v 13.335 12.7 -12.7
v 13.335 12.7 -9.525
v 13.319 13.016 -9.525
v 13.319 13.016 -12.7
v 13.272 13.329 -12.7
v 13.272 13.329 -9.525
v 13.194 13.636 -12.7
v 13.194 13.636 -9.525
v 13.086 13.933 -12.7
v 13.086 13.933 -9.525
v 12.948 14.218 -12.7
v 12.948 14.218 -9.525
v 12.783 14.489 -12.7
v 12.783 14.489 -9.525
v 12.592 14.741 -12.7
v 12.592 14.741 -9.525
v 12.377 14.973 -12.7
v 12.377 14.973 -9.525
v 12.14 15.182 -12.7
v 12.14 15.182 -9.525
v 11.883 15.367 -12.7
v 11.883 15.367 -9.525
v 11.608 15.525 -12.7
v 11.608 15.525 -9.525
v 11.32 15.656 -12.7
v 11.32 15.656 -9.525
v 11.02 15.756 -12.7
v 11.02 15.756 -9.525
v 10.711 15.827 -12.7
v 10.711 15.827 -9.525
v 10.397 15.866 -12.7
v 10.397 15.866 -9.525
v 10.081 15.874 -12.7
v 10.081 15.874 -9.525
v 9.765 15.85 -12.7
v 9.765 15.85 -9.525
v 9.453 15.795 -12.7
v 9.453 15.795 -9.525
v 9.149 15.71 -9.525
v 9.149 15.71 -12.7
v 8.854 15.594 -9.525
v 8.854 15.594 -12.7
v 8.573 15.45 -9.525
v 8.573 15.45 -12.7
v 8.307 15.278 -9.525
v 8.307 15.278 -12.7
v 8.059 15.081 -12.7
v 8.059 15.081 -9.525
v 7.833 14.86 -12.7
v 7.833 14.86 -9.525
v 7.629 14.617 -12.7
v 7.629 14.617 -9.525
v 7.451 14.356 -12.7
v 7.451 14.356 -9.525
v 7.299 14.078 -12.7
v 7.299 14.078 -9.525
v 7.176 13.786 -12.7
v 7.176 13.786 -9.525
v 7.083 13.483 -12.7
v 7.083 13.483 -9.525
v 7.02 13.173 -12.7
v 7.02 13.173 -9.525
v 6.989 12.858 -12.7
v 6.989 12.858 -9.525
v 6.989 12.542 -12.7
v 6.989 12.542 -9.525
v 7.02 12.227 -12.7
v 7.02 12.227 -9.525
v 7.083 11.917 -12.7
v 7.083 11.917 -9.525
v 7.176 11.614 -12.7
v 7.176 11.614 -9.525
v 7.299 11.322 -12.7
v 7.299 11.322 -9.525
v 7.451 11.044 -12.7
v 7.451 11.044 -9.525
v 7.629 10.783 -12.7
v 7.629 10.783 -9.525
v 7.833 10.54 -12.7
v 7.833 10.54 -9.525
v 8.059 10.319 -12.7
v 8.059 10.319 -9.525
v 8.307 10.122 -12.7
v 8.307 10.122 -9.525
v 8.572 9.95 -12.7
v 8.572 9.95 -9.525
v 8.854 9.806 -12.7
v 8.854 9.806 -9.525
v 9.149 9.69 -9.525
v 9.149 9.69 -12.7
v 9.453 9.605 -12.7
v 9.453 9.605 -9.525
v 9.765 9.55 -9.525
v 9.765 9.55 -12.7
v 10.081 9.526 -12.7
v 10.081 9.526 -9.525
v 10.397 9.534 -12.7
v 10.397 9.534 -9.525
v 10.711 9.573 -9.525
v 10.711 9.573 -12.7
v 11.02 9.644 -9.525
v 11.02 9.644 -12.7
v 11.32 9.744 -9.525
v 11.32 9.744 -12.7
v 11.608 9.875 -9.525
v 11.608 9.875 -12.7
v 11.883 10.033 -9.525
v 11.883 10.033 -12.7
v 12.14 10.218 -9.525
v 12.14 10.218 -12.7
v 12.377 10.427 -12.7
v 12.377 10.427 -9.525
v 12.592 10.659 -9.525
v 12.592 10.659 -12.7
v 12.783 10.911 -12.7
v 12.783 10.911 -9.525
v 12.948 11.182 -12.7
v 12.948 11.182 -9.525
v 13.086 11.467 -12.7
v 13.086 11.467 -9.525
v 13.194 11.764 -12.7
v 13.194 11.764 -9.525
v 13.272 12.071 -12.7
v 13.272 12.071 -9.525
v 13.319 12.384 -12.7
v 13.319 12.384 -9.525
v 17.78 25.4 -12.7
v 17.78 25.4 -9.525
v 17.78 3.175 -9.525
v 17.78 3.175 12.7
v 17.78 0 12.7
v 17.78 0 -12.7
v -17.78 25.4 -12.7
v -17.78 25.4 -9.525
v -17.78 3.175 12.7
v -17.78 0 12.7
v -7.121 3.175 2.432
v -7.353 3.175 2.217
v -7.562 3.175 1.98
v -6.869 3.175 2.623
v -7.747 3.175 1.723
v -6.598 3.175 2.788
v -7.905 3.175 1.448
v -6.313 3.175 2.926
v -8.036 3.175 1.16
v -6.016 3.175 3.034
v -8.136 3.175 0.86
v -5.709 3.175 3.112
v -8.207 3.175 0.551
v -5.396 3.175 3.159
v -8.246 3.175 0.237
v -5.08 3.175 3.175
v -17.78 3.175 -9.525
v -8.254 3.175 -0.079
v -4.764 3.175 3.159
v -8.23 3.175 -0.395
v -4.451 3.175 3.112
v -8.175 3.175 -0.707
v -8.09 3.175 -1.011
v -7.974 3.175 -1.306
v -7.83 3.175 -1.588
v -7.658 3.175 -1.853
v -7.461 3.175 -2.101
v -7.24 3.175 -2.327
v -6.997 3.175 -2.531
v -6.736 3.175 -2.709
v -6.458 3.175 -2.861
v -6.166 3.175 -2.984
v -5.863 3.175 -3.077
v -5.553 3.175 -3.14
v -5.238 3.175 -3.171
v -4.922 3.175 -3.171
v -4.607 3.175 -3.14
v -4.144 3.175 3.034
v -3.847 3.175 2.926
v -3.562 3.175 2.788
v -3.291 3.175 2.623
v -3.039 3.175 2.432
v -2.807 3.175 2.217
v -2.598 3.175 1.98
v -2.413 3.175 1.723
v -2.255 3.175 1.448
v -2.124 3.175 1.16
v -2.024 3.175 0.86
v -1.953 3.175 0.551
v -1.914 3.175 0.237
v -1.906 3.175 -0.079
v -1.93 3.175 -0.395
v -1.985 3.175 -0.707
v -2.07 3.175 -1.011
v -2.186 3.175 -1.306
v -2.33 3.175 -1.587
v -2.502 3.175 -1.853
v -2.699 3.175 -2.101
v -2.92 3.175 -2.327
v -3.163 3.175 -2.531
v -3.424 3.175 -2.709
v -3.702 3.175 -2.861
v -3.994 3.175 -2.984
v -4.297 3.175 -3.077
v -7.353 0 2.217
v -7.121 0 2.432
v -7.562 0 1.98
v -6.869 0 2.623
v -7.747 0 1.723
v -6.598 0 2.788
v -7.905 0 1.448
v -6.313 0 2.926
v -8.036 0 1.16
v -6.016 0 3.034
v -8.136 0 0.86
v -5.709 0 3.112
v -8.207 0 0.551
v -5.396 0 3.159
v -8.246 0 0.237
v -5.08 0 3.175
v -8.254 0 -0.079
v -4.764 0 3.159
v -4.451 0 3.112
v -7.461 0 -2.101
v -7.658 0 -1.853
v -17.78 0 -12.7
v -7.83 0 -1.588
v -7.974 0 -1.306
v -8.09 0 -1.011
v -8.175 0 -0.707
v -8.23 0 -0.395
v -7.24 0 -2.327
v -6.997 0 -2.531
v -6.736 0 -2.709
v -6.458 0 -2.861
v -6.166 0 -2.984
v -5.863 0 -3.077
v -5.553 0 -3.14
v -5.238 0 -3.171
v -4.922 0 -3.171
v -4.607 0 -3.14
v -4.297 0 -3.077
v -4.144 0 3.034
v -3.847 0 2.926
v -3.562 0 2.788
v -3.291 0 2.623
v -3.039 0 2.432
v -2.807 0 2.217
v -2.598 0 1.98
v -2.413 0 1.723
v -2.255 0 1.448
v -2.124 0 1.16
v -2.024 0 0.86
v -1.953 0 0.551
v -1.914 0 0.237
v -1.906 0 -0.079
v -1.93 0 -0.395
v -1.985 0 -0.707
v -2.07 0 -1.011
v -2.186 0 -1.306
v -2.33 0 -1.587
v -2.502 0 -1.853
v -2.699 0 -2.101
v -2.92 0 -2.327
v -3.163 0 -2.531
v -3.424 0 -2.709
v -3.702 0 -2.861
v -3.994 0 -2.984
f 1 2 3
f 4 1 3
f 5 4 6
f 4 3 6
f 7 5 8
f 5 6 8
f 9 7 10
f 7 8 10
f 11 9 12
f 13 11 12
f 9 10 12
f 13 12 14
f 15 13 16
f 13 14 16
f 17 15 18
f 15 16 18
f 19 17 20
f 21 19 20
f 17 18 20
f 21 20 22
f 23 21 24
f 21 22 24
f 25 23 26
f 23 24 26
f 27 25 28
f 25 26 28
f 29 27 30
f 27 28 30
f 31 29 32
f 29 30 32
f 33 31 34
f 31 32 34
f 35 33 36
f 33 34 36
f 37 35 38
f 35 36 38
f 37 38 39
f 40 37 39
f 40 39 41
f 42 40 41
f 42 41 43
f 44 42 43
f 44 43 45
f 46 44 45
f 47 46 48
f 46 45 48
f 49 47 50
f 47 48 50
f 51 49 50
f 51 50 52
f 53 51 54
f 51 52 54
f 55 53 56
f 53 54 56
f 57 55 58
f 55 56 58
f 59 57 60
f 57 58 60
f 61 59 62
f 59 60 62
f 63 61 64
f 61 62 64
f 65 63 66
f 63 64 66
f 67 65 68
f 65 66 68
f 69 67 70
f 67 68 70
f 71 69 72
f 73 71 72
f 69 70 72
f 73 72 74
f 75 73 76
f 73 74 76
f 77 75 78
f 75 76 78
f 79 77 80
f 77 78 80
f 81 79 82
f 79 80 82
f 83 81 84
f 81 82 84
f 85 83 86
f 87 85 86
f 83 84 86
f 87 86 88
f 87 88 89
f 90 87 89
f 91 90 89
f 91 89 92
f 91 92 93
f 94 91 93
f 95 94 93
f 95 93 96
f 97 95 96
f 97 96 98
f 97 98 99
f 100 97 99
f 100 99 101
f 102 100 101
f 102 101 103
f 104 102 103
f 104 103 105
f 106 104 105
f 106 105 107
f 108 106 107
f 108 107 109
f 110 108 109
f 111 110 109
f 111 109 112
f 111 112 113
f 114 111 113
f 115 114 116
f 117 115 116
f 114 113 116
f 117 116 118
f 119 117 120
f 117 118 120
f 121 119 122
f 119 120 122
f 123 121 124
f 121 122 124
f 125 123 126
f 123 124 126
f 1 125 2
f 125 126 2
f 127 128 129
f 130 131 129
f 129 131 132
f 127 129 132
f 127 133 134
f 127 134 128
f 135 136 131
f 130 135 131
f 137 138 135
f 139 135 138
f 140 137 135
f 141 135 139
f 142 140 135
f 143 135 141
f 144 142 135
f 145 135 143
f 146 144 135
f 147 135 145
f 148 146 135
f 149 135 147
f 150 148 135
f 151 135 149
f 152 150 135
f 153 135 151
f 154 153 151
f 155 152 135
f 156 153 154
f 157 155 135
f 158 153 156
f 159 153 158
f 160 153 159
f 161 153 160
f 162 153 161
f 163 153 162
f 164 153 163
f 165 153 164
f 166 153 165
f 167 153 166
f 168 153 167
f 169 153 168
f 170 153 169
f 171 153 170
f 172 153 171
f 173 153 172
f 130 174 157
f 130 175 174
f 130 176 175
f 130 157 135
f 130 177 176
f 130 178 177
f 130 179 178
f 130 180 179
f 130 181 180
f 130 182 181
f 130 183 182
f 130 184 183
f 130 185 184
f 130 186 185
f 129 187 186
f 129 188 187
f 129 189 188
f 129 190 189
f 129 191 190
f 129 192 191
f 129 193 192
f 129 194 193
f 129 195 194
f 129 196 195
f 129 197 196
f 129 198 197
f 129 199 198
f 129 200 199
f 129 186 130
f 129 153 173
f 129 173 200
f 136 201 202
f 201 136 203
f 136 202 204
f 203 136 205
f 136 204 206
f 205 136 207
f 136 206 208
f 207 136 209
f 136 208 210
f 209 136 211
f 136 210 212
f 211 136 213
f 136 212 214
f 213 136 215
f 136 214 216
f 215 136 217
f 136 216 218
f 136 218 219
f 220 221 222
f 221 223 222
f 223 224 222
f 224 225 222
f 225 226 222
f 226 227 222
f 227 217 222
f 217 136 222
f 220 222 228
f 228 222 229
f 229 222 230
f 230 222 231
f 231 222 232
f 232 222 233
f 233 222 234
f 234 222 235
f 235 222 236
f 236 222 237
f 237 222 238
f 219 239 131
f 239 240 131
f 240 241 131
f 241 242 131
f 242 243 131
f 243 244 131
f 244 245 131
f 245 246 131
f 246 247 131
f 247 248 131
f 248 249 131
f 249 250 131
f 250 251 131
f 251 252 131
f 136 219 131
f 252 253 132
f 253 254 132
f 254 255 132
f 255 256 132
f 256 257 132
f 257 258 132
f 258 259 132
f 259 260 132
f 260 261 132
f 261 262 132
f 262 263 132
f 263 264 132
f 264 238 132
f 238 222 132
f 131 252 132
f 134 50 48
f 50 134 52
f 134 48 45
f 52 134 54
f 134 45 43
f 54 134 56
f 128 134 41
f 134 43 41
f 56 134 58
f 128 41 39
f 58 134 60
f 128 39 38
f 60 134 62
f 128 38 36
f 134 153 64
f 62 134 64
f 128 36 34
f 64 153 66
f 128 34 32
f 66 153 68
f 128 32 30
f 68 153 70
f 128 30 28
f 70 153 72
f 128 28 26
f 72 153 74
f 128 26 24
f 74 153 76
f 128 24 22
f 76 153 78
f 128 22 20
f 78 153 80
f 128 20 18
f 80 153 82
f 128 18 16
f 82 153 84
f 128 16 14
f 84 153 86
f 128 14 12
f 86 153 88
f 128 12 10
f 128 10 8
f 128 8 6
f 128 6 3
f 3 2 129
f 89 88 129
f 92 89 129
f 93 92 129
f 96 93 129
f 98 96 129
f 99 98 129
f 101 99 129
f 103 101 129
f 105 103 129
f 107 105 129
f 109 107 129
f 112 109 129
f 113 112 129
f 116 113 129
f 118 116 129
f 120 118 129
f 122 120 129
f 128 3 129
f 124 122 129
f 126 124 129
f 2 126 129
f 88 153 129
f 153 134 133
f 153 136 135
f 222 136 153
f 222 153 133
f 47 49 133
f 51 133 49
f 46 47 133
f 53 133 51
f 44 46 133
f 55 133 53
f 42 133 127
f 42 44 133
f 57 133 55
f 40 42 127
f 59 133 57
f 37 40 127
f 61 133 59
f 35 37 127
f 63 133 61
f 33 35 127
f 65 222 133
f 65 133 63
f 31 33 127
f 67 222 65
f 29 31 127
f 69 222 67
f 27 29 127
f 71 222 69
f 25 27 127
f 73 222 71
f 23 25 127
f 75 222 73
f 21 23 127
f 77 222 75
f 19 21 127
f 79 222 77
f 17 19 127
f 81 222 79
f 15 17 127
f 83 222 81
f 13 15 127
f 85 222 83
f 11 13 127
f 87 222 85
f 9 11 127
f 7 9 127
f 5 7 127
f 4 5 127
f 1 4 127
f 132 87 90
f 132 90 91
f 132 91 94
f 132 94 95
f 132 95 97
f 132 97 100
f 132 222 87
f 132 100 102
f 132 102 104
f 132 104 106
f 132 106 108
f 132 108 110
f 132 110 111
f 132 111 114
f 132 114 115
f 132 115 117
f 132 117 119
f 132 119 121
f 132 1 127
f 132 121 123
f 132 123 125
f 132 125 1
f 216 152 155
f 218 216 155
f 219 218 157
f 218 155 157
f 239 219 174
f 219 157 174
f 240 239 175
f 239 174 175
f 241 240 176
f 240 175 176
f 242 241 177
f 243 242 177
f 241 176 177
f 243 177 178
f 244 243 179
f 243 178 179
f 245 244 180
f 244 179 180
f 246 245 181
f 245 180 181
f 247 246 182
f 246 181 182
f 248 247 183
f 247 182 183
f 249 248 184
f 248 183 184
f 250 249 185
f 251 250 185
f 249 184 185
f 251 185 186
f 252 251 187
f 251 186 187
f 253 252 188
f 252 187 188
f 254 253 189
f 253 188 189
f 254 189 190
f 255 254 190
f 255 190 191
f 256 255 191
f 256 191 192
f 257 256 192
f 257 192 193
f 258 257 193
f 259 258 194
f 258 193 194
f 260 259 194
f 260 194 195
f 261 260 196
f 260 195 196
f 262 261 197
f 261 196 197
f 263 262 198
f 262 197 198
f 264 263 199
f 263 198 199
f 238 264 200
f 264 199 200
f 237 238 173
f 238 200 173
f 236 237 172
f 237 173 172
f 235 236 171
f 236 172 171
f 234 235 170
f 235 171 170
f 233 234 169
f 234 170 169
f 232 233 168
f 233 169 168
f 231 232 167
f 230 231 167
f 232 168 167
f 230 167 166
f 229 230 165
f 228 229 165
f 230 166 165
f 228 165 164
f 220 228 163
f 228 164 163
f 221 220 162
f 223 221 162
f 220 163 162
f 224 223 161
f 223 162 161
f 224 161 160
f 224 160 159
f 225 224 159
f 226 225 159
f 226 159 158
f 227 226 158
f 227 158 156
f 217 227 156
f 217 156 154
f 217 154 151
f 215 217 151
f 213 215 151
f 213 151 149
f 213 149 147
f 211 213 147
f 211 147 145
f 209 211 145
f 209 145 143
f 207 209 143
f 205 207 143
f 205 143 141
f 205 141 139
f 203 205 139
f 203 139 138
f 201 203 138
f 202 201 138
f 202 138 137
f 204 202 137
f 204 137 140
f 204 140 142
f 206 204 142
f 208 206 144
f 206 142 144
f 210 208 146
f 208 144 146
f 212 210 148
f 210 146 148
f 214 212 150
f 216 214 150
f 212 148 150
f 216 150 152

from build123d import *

# Parameters (mm, degrees)
SKETCH1_W           = 35.56
SKETCH1_H           = 25.4
BOSS_EXTRUDE1_DEPTH = 3.175
SKETCH2_W           = 35.56
SKETCH2_H           = 3.175
BOSS_EXTRUDE2_DEPTH = 22.225
SKETCH3_R           = 3.175
CUT_EXTRUDE1_DEPTH  = 3.175
SKETCH4_R           = 3.175
CUT_EXTRUDE2_DEPTH  = 3.175


with BuildPart() as part:
    # Sketch1 → Boss-Extrude1 (new body)
    with BuildSketch(Plane(origin=(0, 0, 0), x_dir=(1, 0, 0), z_dir=(0, 1, 0))):
        Rectangle(SKETCH1_W, SKETCH1_H)
    extrude(amount=BOSS_EXTRUDE1_DEPTH)

    # Sketch2 → Boss-Extrude2 (add)
    with BuildSketch(Plane(origin=(0, 3.175, 0), x_dir=(1, 0, 0), z_dir=(0, 1, 0))):
        with Locations((0, 11.1125)):
            Rectangle(SKETCH2_W, SKETCH2_H)
    extrude(amount=BOSS_EXTRUDE2_DEPTH)

    # Sketch3 → Cut-Extrude1 (cut)
    with BuildSketch(Plane(origin=(0, 3.175, 0), x_dir=(1, 0, 0), z_dir=(0, 1, 0))):
        with Locations(Location((-5.08, 0, 0), (0, 0, 270))):
            Circle(SKETCH3_R)
    extrude(amount=-CUT_EXTRUDE1_DEPTH, mode=Mode.SUBTRACT)

    # Sketch4 → Cut-Extrude2 (cut)
    with BuildSketch(Plane.XY.offset(-9.525)):
        with Locations((10.16, 12.7)):
            Circle(SKETCH4_R)
    extrude(amount=-CUT_EXTRUDE2_DEPTH, mode=Mode.SUBTRACT)


solid = part.part
